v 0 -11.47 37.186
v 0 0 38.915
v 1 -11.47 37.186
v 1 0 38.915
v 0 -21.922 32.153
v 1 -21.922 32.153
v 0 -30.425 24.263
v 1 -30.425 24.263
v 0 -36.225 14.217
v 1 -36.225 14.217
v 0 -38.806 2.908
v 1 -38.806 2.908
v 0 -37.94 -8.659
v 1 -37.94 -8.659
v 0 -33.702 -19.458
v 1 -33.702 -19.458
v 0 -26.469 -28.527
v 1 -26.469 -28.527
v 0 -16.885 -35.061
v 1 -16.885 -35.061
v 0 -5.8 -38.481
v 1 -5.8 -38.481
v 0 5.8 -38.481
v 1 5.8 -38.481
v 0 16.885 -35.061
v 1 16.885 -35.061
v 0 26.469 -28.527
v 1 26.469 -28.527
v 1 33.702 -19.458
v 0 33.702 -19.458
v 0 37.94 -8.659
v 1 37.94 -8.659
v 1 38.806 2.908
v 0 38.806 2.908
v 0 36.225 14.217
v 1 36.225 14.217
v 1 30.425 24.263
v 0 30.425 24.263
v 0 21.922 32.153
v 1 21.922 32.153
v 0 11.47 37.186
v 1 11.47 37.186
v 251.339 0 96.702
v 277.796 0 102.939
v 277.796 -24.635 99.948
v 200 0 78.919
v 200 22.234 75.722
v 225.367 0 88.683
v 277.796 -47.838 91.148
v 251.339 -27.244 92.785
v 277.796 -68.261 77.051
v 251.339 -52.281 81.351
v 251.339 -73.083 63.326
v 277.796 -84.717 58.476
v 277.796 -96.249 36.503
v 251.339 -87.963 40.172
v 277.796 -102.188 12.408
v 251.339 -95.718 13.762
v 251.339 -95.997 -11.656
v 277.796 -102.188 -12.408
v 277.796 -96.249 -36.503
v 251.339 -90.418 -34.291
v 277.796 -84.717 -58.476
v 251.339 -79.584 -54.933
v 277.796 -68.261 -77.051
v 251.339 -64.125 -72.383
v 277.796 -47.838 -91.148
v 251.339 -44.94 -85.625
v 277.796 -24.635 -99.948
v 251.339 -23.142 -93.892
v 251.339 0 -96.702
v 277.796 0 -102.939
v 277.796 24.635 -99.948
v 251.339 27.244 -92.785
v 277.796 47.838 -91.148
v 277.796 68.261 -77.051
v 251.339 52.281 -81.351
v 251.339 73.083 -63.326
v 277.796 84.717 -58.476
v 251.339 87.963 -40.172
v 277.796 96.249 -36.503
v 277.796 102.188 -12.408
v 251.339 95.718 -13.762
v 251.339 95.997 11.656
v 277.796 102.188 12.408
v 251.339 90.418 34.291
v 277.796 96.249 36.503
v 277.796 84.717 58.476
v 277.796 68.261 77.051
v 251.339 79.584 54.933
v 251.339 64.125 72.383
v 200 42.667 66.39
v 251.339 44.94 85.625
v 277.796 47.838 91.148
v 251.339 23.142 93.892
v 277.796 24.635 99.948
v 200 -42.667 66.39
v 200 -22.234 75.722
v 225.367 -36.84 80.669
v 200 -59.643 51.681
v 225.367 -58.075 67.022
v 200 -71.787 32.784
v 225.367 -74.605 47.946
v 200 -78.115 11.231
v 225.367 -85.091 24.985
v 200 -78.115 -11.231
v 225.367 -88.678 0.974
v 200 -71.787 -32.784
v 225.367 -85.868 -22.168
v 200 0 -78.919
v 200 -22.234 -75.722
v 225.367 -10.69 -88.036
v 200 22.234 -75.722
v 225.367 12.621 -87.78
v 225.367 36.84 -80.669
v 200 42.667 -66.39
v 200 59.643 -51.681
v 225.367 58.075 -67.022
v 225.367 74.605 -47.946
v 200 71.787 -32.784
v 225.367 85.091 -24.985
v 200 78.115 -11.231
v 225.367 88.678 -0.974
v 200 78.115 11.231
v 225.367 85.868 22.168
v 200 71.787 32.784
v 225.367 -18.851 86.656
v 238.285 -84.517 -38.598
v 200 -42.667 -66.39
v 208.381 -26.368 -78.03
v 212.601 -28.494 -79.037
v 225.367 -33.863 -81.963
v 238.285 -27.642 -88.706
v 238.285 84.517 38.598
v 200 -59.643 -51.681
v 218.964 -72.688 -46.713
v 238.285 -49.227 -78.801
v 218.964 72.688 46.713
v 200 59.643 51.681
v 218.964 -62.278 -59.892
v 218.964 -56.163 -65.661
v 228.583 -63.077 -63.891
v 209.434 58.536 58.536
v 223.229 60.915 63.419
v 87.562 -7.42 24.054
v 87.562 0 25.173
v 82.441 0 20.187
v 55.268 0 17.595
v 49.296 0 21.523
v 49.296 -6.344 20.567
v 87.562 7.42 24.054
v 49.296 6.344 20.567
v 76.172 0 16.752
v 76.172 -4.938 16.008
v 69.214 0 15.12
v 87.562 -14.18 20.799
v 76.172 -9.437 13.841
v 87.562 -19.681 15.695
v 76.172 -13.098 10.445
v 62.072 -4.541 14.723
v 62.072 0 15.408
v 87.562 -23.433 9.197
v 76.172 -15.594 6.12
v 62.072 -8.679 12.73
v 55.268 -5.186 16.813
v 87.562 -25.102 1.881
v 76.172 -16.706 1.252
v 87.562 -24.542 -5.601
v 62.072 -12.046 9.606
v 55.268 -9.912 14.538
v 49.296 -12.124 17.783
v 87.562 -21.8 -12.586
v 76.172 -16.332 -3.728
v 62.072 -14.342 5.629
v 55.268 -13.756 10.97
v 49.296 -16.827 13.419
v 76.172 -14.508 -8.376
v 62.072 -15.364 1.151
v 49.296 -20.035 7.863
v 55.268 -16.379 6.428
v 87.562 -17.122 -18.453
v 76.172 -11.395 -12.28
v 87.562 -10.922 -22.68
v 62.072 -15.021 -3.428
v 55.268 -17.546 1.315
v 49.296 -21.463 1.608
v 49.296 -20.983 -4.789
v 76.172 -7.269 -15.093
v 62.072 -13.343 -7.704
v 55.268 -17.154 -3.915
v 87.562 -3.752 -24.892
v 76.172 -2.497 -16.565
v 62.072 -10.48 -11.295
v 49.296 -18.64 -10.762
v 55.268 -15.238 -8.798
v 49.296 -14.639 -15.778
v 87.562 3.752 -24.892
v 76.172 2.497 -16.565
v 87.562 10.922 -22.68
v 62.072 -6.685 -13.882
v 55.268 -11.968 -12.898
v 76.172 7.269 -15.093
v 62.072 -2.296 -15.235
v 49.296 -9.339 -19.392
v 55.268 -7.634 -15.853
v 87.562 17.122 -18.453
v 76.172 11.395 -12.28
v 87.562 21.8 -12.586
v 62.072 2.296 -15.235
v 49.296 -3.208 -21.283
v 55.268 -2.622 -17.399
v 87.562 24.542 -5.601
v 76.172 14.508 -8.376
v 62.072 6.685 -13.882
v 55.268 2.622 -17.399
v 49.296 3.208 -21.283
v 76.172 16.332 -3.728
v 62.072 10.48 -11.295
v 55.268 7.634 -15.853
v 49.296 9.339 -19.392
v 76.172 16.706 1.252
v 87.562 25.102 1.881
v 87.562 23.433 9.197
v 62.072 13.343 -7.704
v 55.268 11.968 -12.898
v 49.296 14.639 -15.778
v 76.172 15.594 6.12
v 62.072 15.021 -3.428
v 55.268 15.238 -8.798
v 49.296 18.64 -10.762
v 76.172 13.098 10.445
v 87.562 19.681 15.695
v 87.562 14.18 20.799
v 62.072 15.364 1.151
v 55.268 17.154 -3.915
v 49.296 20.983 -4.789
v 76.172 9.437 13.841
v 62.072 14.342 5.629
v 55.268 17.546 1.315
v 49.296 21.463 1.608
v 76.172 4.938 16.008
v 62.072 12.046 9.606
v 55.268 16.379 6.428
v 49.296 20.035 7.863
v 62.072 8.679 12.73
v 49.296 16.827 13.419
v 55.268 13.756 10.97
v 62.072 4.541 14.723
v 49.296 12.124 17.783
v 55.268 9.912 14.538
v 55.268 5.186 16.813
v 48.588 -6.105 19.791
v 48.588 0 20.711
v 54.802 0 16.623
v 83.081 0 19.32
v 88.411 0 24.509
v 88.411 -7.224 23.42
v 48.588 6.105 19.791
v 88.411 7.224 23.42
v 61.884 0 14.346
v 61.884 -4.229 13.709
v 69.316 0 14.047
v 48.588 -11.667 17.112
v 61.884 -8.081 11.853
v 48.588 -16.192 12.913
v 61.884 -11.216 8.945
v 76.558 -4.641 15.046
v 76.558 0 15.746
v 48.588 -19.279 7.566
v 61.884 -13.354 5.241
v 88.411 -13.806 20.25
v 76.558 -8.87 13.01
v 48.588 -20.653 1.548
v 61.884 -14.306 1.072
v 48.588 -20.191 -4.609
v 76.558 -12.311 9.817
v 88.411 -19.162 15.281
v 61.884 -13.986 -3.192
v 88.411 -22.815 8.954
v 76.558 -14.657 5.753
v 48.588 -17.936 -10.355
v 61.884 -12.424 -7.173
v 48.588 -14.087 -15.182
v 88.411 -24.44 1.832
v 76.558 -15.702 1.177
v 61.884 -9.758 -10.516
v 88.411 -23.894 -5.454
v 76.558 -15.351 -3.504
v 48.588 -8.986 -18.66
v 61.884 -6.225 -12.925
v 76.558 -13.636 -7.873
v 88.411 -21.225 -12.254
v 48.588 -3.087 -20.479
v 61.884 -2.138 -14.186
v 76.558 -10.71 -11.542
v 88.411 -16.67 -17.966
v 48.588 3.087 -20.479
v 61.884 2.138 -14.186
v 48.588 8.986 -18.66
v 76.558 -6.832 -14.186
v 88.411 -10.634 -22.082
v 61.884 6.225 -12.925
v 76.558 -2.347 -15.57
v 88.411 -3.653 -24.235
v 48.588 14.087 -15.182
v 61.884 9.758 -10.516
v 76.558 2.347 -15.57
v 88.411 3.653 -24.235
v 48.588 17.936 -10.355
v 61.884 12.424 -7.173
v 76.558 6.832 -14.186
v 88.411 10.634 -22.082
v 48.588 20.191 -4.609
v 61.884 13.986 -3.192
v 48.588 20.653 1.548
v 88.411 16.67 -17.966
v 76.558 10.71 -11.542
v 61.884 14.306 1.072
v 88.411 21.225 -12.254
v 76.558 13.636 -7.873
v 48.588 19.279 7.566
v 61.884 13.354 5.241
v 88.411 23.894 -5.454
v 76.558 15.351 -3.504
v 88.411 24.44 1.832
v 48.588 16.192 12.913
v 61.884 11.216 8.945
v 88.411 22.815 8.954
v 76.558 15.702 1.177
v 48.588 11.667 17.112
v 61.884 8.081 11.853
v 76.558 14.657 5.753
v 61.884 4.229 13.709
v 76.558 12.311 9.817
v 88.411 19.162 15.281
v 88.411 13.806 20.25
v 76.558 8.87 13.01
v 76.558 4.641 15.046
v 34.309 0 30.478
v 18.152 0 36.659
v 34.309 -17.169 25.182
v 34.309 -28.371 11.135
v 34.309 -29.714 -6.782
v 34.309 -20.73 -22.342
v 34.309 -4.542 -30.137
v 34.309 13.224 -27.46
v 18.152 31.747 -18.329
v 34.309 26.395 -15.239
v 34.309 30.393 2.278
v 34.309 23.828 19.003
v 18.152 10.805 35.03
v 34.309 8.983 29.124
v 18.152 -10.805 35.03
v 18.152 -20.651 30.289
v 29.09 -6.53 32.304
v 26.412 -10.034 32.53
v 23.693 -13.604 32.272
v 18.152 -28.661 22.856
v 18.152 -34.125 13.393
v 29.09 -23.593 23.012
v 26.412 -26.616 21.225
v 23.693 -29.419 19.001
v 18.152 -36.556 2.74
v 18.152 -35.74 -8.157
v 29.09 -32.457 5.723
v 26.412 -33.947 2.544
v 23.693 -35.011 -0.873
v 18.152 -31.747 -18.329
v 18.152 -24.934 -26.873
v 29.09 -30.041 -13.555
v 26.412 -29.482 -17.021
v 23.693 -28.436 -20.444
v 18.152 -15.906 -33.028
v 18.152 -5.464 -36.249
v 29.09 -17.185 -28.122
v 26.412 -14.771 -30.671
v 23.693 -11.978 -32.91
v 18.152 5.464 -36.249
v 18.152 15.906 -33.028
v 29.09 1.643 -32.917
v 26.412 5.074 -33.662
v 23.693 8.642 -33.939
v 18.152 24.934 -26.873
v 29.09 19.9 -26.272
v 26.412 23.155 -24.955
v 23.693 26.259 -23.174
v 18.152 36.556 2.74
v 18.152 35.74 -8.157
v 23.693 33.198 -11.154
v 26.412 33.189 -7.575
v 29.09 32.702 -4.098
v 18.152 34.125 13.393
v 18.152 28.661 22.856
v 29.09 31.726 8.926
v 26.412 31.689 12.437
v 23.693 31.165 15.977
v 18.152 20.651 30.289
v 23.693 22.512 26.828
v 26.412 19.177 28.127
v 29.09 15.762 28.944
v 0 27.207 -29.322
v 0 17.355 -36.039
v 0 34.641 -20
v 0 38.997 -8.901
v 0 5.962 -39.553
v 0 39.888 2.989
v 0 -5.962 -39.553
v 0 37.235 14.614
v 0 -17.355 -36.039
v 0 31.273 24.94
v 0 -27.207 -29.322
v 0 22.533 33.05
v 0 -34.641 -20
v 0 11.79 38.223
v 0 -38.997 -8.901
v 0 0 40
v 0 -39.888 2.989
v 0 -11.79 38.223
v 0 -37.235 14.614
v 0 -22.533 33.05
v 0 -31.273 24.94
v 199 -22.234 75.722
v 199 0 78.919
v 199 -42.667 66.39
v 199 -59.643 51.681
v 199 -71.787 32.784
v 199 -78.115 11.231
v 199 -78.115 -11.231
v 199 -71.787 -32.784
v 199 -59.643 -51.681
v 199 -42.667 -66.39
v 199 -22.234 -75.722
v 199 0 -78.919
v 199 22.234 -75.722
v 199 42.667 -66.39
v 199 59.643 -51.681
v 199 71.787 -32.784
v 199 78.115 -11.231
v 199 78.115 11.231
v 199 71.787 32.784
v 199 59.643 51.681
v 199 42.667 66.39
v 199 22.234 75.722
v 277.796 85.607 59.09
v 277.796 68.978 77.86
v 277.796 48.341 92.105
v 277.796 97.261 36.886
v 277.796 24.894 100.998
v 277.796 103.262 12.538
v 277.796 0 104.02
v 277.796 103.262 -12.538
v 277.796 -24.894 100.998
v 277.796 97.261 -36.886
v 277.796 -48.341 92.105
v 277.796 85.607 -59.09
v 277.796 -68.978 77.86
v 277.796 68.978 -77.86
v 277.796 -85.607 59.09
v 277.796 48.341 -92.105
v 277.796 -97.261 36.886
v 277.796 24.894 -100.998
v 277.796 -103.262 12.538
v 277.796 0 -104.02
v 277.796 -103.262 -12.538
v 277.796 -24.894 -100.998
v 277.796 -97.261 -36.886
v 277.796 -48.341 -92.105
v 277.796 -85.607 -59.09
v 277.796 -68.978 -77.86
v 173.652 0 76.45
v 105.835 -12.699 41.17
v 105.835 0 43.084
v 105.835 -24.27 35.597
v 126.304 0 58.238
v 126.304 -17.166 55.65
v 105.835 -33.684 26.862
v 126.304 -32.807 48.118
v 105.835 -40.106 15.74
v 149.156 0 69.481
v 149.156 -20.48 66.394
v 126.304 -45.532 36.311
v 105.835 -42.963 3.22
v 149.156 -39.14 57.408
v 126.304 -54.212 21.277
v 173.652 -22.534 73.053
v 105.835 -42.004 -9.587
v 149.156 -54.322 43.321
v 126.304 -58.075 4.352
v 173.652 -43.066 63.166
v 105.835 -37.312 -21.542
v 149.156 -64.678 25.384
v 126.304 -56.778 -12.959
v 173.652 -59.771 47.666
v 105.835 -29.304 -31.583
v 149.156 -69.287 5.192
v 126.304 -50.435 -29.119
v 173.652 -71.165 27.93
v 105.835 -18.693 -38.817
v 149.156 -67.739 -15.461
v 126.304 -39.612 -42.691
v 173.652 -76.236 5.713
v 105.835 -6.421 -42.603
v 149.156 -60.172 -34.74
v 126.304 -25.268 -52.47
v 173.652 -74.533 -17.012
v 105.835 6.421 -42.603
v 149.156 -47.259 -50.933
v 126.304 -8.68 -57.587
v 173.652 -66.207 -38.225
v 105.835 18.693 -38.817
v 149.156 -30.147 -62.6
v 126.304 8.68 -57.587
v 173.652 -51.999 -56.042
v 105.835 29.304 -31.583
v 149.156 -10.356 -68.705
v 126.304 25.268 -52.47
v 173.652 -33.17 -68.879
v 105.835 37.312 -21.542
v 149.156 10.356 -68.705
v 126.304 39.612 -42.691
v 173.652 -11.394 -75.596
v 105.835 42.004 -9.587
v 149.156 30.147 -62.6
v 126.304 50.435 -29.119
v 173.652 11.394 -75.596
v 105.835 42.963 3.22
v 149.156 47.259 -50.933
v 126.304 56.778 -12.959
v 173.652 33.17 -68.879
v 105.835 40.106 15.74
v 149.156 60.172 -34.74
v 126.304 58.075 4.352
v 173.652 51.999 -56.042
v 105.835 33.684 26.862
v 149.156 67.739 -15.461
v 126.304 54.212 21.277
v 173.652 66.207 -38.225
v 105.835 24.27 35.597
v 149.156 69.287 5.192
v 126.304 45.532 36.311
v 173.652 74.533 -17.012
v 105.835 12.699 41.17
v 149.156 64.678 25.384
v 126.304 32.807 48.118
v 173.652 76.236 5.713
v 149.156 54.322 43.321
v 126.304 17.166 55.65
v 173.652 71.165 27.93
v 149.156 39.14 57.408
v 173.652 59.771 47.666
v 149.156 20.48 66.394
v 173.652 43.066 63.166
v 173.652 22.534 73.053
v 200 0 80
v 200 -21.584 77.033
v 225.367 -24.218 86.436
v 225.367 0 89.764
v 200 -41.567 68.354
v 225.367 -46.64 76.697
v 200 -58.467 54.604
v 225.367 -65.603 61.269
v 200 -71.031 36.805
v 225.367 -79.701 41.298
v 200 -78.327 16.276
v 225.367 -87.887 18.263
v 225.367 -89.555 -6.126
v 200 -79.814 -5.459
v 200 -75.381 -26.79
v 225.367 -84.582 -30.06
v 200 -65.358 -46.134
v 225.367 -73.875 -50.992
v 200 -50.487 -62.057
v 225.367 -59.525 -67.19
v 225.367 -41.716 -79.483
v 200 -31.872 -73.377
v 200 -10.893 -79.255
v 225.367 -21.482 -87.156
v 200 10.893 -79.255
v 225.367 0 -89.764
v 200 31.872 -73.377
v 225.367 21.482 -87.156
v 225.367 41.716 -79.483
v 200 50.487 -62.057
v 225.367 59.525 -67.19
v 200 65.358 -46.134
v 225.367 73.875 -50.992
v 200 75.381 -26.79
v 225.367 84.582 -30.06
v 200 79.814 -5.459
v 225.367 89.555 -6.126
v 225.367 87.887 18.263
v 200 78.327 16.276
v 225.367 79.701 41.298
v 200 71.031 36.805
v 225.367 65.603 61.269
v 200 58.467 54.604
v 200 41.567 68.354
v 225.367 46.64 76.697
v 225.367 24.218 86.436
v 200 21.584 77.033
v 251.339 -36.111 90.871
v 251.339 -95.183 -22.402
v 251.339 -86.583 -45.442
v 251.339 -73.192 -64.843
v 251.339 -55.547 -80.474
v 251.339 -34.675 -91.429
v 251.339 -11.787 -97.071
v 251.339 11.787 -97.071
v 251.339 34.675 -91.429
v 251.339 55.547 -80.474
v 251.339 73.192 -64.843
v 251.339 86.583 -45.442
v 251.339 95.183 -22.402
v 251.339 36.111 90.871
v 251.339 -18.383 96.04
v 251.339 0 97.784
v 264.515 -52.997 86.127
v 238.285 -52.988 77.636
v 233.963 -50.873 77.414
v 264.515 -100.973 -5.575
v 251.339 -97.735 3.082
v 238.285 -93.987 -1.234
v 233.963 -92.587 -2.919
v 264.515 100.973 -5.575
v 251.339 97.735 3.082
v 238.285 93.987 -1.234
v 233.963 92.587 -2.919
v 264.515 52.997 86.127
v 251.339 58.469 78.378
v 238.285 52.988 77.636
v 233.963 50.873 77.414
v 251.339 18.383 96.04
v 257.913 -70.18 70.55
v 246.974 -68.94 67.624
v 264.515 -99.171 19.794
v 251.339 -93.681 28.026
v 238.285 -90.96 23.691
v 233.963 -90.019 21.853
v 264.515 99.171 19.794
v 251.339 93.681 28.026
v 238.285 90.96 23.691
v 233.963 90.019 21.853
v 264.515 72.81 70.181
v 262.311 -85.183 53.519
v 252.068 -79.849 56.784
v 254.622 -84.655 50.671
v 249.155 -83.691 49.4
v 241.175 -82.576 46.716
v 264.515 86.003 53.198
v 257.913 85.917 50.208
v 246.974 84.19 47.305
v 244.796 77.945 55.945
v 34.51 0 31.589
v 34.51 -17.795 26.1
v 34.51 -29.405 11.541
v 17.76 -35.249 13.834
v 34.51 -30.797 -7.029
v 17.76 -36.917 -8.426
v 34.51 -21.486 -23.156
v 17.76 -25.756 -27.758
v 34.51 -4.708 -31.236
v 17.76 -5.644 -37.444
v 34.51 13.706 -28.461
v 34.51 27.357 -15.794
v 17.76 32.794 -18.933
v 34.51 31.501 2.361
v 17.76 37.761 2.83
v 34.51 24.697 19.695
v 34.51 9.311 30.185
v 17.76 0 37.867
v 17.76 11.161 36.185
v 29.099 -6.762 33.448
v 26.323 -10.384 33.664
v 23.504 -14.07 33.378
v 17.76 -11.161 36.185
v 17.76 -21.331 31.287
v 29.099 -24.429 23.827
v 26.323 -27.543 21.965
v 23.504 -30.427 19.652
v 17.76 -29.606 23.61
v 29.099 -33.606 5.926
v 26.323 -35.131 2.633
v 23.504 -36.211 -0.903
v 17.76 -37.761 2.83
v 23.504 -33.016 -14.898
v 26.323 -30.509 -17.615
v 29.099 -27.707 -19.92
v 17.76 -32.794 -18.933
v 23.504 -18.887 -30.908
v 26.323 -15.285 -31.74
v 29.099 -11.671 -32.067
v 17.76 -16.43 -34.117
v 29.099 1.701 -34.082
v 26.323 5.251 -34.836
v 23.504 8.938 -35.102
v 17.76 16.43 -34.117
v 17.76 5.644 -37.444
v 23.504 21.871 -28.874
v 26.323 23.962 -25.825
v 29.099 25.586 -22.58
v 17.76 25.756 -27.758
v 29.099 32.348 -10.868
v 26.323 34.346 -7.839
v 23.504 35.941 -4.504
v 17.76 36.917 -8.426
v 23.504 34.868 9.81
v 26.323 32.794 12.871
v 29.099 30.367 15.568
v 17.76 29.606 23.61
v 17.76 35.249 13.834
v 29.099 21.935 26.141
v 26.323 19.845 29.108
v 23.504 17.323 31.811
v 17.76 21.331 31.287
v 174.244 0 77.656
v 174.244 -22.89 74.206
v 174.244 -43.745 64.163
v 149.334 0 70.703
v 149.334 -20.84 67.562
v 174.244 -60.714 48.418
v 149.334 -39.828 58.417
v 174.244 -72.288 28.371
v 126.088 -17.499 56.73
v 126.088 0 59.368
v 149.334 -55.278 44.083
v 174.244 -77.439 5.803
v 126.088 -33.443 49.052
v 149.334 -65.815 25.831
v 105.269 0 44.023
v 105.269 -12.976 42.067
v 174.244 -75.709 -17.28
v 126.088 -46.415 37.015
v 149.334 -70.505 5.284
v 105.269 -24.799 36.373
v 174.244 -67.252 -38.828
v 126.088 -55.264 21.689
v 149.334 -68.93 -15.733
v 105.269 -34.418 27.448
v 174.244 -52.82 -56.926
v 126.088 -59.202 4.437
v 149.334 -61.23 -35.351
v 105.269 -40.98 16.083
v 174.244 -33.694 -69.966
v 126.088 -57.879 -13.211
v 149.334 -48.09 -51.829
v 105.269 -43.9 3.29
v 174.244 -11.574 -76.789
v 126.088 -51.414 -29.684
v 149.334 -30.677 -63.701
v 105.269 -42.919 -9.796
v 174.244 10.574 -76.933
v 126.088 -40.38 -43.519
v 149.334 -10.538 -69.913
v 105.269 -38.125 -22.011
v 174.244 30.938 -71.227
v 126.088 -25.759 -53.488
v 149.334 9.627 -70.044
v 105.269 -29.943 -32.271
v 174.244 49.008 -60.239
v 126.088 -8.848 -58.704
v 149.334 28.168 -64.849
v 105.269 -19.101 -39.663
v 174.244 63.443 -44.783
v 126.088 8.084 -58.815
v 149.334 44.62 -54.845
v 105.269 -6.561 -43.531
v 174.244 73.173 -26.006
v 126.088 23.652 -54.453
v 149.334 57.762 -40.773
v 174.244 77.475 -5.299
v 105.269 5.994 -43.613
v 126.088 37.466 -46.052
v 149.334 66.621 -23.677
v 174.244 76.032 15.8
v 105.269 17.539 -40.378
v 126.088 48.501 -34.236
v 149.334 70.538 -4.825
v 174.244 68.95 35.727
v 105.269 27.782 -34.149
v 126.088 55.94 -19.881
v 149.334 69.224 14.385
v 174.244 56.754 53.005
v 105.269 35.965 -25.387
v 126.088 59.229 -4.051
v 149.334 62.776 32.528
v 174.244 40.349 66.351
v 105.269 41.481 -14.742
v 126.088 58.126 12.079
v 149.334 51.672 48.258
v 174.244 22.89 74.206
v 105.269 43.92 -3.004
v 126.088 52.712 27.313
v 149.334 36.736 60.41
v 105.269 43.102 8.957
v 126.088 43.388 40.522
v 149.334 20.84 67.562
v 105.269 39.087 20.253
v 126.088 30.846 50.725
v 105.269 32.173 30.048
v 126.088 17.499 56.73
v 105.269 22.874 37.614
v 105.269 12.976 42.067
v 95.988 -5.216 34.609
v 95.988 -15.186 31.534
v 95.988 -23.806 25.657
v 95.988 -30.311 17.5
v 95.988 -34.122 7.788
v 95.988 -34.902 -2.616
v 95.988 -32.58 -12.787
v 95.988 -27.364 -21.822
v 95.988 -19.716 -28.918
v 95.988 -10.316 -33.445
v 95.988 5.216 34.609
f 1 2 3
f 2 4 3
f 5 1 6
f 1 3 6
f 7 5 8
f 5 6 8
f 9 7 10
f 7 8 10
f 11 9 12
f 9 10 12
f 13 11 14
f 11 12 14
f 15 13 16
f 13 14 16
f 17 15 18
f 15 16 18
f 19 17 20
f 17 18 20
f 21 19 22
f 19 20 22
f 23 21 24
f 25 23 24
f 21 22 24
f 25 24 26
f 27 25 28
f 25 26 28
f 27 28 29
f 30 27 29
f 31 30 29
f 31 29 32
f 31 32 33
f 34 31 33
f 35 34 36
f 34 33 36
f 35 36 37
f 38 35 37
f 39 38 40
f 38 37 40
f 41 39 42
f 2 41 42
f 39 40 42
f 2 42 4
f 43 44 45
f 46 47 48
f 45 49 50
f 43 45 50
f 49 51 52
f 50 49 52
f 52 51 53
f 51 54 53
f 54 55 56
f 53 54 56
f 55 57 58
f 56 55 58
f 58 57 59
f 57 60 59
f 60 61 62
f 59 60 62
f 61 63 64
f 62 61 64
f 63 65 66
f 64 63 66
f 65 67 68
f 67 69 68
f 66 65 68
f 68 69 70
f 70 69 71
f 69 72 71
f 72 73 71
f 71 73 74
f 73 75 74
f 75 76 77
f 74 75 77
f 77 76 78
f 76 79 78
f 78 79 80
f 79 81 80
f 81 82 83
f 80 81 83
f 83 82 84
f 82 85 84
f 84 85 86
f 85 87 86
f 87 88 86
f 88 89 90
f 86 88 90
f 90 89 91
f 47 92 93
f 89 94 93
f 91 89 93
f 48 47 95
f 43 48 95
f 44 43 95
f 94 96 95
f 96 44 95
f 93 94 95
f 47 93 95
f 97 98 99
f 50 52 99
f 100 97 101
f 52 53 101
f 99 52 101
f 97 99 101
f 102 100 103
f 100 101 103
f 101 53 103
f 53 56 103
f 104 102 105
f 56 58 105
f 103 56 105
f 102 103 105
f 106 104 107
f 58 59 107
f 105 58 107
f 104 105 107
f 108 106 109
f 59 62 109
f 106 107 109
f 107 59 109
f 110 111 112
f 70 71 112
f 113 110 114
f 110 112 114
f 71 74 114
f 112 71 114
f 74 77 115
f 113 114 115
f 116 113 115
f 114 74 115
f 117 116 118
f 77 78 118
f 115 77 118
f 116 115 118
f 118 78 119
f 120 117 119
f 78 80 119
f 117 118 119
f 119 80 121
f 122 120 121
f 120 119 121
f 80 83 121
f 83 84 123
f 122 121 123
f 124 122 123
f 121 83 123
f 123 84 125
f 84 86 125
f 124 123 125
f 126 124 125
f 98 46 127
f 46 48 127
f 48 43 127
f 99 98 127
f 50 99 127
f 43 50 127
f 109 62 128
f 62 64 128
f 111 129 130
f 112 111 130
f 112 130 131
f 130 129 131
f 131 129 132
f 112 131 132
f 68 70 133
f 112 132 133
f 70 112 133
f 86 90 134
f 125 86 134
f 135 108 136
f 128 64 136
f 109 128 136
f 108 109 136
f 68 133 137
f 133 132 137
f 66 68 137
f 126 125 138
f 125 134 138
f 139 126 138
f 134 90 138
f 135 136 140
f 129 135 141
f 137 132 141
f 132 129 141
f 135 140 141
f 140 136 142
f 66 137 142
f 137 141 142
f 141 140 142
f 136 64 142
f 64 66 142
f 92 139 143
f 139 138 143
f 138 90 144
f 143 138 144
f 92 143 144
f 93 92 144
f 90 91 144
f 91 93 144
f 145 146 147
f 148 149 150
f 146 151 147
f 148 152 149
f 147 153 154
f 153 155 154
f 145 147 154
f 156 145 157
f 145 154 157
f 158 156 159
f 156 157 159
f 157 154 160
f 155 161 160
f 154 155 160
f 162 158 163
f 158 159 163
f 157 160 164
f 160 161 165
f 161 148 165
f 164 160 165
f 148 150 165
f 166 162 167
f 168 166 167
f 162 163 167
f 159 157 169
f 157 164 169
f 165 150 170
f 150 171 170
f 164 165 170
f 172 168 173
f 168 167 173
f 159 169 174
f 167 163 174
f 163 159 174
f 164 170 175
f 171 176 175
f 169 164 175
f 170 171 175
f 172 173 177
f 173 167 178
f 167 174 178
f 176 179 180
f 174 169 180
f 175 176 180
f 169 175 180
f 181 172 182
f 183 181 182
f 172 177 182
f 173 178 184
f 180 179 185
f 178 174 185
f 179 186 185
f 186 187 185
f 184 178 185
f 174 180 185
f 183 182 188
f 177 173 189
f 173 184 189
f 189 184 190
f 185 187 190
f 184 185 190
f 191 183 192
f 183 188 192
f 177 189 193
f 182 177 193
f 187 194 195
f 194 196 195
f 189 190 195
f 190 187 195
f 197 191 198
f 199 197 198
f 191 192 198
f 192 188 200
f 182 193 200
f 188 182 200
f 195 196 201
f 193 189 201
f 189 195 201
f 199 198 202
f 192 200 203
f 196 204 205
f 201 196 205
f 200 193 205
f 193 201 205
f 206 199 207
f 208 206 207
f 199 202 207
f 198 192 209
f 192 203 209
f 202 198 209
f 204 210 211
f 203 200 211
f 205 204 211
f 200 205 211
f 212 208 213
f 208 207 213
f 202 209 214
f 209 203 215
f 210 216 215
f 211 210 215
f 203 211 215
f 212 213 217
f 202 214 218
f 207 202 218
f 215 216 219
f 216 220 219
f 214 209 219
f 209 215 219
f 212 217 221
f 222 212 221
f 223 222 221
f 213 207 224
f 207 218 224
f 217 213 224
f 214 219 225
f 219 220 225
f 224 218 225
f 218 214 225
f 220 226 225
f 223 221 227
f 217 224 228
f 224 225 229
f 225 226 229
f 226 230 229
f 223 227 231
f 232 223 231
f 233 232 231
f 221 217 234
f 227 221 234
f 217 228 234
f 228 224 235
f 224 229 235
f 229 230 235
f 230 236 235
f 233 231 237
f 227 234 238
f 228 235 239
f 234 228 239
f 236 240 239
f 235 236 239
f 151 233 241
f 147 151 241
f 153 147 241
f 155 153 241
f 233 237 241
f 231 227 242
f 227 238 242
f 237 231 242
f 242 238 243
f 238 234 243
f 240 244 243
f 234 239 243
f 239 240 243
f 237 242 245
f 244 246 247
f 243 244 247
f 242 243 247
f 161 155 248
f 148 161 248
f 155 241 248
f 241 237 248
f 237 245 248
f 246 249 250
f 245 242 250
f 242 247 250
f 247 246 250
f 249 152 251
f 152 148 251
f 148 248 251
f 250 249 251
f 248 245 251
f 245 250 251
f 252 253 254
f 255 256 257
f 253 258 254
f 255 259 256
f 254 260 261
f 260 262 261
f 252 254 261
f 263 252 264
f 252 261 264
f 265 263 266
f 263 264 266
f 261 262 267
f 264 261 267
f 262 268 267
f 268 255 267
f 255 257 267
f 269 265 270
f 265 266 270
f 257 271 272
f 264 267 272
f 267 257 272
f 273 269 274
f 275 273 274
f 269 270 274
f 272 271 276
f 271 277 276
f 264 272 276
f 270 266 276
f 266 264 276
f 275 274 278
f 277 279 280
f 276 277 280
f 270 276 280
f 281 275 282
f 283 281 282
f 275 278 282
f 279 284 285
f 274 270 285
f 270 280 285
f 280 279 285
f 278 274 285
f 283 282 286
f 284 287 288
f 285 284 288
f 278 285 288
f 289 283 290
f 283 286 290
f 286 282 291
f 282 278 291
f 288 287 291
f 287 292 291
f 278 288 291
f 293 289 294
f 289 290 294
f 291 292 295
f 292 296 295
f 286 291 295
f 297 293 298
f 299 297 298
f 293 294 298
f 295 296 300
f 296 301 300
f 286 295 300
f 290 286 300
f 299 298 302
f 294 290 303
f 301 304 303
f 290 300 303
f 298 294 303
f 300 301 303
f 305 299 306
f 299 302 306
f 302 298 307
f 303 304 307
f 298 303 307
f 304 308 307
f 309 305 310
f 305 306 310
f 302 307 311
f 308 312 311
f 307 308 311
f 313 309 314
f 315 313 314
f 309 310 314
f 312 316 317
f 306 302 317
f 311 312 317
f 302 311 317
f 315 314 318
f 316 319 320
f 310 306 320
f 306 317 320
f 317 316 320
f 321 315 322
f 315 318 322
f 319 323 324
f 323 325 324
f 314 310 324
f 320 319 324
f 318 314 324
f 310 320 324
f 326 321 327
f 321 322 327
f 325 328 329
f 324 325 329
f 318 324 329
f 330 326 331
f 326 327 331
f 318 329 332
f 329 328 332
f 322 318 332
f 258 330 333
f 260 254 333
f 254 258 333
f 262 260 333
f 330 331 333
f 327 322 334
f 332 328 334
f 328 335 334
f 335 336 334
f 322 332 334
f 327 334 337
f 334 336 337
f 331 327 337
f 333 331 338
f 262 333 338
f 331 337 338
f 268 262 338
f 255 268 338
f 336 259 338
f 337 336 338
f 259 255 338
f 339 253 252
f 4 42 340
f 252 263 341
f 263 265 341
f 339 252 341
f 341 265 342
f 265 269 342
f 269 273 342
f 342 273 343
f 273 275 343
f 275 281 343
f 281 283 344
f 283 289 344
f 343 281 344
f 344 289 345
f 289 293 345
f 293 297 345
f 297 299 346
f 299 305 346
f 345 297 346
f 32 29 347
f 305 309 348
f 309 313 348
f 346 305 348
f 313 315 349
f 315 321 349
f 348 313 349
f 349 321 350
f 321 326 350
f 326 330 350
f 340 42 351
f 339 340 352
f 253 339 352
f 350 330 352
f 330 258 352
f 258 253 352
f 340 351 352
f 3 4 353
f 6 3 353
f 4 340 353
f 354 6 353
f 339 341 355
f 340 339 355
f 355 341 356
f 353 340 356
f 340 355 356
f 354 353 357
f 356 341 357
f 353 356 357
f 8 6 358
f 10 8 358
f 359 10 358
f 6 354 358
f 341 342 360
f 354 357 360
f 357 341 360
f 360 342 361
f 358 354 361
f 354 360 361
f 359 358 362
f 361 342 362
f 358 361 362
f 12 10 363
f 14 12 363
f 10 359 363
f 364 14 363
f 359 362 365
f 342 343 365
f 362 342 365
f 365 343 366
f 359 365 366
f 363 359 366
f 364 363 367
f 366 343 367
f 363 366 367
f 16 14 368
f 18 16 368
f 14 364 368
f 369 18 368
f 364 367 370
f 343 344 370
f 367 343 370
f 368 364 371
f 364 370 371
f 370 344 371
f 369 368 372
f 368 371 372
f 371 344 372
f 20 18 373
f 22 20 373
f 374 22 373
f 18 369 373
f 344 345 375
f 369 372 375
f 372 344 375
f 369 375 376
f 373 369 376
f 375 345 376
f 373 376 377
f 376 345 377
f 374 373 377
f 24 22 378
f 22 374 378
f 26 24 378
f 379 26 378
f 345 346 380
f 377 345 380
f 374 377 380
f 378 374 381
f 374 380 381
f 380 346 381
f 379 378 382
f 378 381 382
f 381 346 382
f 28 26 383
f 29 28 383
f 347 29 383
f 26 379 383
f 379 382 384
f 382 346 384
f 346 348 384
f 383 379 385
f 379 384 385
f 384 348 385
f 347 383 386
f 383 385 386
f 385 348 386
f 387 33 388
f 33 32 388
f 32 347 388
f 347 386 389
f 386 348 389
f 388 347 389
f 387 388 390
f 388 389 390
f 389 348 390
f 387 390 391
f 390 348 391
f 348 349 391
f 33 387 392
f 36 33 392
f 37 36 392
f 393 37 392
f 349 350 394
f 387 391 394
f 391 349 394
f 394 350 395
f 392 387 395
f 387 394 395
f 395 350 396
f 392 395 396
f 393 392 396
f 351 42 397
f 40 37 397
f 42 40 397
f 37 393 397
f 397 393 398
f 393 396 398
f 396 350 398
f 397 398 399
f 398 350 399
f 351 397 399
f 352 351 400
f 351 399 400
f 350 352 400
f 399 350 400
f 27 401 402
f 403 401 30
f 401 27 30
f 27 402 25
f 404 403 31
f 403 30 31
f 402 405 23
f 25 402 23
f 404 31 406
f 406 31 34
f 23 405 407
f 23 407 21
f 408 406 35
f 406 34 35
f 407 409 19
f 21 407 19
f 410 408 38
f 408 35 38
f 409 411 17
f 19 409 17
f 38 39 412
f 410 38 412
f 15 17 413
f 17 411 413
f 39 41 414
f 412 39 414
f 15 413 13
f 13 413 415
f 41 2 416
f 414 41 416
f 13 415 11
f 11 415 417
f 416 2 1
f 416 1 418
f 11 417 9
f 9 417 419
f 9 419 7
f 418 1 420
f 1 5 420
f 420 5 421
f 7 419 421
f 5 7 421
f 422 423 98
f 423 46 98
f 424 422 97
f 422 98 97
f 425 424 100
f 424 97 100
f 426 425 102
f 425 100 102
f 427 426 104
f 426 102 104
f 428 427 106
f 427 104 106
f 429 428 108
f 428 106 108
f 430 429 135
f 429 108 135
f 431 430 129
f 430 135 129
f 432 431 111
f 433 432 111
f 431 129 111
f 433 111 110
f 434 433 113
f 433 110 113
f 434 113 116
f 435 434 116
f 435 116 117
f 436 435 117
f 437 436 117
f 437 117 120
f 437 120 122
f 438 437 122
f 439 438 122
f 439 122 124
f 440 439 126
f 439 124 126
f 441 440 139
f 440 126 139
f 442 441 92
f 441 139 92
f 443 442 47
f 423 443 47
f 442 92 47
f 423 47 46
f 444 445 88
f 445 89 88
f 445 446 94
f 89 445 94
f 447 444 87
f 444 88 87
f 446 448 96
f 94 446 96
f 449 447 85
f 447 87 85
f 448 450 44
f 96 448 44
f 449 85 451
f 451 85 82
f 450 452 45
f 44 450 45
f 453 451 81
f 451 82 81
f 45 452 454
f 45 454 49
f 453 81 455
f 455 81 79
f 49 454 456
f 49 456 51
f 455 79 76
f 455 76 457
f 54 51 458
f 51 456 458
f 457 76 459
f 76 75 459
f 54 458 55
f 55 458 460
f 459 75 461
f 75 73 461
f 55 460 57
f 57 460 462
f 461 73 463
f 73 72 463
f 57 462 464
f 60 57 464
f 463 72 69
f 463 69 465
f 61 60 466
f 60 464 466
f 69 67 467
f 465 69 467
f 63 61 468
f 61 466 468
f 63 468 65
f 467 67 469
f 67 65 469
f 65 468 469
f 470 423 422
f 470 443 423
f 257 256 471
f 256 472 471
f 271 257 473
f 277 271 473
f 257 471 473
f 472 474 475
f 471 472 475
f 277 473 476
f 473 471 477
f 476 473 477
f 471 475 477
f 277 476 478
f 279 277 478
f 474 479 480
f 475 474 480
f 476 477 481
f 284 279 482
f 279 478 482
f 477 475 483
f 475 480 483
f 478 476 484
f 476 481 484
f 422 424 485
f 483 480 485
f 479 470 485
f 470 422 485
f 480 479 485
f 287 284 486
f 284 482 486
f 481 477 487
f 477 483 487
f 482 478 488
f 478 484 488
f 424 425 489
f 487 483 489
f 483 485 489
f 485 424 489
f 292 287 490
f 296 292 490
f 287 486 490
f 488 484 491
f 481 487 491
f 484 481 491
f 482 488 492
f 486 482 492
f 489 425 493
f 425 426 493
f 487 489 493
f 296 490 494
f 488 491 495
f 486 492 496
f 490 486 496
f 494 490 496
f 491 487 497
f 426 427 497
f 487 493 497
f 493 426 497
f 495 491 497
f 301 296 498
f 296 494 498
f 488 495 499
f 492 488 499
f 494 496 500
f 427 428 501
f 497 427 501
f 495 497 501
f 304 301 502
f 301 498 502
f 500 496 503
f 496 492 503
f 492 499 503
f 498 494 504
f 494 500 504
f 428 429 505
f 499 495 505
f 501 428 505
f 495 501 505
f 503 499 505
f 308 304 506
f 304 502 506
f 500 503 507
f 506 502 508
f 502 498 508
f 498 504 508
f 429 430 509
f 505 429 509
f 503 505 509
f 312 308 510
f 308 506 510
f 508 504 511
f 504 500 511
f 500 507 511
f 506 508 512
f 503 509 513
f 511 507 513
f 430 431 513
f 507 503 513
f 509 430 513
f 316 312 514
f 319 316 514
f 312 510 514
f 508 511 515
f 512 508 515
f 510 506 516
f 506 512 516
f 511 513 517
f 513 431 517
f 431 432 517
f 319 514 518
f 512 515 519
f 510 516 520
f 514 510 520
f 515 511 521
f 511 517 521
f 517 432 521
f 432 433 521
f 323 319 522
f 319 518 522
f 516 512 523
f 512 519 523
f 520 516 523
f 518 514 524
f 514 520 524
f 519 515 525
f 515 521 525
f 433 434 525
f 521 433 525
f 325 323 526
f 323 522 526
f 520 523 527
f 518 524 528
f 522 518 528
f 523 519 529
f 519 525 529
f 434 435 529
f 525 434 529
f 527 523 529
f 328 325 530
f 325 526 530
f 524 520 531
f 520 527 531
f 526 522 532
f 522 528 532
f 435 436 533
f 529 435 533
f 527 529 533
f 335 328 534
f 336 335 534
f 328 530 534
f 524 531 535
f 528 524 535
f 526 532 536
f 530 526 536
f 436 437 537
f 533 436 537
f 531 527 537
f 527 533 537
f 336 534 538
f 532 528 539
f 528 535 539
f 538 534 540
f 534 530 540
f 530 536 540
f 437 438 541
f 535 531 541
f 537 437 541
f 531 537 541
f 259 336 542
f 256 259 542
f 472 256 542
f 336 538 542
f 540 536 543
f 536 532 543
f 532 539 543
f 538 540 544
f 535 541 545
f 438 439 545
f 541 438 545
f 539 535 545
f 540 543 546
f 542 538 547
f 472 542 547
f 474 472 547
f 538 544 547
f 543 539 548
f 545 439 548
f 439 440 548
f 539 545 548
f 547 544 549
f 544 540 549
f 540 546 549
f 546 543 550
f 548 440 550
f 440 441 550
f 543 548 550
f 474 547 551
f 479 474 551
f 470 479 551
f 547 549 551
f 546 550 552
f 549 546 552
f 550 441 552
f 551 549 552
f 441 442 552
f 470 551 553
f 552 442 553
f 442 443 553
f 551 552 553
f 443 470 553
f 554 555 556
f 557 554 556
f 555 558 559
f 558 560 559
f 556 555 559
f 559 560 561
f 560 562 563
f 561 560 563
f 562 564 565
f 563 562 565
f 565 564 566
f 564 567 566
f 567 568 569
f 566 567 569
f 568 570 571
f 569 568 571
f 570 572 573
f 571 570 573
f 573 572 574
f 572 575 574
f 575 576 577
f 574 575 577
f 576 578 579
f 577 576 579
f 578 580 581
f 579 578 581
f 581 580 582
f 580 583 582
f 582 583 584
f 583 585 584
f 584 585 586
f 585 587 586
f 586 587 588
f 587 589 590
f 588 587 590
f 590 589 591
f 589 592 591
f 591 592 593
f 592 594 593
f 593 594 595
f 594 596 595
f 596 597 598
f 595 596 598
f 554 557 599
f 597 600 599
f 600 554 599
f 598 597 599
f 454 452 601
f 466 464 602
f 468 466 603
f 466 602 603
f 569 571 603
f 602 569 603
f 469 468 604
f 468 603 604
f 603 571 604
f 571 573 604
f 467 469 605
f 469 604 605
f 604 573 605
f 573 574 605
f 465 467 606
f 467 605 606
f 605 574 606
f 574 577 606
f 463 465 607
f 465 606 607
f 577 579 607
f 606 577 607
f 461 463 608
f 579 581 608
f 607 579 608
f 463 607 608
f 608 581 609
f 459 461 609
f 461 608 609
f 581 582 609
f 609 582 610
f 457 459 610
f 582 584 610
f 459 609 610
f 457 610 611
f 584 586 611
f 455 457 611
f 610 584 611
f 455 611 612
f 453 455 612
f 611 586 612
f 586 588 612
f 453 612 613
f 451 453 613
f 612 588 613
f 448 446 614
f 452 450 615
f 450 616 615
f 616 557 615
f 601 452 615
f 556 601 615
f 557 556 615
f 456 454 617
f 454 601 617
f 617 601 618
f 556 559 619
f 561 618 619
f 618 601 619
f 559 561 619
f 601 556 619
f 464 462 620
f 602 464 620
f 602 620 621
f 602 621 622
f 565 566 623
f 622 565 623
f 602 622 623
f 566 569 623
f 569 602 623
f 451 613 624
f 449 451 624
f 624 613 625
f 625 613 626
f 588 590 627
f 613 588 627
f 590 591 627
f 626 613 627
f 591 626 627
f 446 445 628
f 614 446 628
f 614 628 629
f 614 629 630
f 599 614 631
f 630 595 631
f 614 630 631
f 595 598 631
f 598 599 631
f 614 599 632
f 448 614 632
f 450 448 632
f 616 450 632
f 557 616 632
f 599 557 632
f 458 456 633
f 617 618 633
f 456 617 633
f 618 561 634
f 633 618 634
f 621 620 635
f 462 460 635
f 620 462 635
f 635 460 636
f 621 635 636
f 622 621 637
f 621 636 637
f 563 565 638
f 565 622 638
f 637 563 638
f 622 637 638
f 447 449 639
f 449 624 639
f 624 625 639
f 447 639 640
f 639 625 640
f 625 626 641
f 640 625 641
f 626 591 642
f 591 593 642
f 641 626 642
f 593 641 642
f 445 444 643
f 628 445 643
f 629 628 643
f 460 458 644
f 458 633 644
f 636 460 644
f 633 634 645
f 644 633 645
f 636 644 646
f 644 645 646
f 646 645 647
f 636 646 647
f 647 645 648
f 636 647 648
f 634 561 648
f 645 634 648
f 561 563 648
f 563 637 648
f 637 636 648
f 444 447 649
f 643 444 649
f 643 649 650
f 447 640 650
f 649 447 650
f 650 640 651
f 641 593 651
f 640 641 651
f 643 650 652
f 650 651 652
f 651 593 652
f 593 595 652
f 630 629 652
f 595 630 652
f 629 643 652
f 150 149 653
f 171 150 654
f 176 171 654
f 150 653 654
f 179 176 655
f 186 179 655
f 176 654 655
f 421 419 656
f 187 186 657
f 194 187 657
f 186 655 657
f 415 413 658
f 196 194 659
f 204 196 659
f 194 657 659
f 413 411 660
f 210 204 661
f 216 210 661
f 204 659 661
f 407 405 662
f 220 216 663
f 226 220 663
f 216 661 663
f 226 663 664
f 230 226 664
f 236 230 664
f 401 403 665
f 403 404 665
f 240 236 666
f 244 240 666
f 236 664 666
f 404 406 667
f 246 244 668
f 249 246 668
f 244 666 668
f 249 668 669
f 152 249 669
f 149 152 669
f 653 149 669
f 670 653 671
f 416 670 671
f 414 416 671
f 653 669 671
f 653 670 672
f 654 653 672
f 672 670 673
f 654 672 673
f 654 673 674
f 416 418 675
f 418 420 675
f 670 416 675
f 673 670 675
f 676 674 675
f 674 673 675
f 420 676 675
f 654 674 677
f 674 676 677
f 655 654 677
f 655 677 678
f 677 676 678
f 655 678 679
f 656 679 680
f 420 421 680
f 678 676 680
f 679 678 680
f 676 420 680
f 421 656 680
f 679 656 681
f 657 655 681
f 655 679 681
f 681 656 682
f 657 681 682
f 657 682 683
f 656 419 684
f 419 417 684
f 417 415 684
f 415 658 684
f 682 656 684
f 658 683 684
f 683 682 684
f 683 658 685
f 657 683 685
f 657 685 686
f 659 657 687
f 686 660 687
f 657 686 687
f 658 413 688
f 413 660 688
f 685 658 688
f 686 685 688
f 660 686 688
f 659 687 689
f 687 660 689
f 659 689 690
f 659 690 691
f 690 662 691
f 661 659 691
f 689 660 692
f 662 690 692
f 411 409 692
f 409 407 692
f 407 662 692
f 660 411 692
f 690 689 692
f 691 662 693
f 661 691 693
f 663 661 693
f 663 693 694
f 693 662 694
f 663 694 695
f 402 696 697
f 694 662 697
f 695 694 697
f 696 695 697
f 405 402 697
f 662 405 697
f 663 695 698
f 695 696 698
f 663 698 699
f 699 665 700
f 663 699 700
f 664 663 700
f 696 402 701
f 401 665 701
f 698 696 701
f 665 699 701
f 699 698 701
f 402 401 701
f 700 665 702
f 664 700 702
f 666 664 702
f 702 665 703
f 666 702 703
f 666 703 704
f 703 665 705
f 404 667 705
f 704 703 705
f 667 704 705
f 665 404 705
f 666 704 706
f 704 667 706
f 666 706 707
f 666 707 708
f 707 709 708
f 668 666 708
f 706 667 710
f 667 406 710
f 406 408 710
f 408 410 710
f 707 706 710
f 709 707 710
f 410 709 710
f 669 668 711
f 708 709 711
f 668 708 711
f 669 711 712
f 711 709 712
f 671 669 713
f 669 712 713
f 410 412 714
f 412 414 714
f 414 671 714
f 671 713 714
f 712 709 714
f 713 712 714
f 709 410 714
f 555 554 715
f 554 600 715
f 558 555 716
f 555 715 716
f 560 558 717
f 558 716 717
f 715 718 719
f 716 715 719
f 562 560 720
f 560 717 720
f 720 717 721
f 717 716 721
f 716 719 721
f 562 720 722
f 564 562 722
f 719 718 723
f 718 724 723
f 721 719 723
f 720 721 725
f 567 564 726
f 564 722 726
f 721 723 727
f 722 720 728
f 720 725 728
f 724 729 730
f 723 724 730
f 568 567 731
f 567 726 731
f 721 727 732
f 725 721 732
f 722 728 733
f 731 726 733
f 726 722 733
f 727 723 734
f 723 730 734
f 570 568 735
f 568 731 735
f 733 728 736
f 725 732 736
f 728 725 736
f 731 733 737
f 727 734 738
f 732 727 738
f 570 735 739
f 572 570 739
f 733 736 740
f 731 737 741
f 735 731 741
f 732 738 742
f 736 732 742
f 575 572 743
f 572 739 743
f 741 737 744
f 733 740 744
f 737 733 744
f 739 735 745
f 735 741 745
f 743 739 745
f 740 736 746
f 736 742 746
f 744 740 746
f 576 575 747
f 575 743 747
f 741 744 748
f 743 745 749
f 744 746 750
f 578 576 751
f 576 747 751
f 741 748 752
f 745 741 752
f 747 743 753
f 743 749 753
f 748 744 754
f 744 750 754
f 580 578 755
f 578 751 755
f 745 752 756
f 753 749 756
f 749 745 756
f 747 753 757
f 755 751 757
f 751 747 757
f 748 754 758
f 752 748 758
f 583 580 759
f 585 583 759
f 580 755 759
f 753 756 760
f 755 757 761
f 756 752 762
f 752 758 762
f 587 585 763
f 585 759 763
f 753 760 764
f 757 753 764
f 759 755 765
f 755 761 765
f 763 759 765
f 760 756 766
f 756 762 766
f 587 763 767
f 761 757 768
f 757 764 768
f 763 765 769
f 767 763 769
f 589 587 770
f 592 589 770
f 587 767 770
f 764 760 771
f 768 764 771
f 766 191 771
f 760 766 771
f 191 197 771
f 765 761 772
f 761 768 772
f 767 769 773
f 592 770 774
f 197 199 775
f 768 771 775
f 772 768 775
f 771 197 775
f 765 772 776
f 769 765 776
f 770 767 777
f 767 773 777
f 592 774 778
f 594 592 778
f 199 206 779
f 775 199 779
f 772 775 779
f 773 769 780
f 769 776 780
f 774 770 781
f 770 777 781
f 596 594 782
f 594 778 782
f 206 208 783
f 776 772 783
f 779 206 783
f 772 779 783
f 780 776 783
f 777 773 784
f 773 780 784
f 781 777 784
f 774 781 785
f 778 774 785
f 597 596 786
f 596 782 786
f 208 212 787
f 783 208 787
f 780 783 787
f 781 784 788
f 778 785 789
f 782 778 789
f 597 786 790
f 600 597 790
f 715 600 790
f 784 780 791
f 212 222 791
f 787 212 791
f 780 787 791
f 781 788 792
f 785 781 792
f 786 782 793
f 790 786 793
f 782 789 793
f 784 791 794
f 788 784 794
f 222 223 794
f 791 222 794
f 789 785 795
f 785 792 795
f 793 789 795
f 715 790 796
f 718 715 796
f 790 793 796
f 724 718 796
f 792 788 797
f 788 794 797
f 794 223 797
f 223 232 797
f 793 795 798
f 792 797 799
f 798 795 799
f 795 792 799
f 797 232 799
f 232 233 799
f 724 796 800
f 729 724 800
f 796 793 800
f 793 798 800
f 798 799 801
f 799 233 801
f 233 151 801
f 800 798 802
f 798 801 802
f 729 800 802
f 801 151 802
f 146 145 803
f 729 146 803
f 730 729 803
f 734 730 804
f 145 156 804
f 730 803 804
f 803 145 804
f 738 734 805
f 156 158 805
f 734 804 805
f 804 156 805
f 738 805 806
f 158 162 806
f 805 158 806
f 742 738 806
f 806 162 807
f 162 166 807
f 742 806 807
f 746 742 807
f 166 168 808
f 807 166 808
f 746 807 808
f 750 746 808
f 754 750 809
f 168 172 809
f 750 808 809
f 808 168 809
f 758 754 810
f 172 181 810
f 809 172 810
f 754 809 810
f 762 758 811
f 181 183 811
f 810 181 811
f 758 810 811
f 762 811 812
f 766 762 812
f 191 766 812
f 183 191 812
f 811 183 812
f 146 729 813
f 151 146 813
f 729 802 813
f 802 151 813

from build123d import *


with BuildPart() as part:
    # Croquis1 → Revolución4 (revolve)
    with BuildSketch(Plane.XY, mode=Mode.PRIVATE) as revoluci_n4_sk:
        with BuildLine():
            Line((199, 78.918522676), (200, 78.918522676))
            ThreePointArc((200, 78.918522676), (238.285228956, 92.913252463), (277.795971192, 102.938843023))
            Line((277.795971192, 102.938843023), (277.795971192, 104.020320348))
            ThreePointArc((277.795971192, 104.020320348), (238.285228956, 93.994729787), (200, 80))
            ThreePointArc((200, 80), (137.453289795, 65.562899543), (87.561875557, 25.172707511))
            ThreePointArc((87.561875557, 25.172707511), (69.213976897, 15.119616963), (49.296496377, 21.523052333))
            ThreePointArc((49.296496377, 21.523052333), (26.322719037, 35.229014392), (0, 40))
            Line((0, 40), (0, 38.915288903))
            Line((0, 38.915288903), (1, 38.915288903))
            ThreePointArc((1, 38.915288903), (26.412003084, 34.042566774), (48.5879763, 20.710667675))
            ThreePointArc((48.5879763, 20.710667675), (69.316324283, 14.046539825), (88.411190614, 24.508905232))
            ThreePointArc((88.411190614, 24.508905232), (137.4767114, 64.374064962), (199, 78.918522676))
        make_face()
    revolve(revoluci_n4_sk.sketch.rotate(Axis((0, 0, 0), (1, 0, 0)), 90), axis=Axis((0, 0, 0), (1, 0, 0)))


solid = part.part
